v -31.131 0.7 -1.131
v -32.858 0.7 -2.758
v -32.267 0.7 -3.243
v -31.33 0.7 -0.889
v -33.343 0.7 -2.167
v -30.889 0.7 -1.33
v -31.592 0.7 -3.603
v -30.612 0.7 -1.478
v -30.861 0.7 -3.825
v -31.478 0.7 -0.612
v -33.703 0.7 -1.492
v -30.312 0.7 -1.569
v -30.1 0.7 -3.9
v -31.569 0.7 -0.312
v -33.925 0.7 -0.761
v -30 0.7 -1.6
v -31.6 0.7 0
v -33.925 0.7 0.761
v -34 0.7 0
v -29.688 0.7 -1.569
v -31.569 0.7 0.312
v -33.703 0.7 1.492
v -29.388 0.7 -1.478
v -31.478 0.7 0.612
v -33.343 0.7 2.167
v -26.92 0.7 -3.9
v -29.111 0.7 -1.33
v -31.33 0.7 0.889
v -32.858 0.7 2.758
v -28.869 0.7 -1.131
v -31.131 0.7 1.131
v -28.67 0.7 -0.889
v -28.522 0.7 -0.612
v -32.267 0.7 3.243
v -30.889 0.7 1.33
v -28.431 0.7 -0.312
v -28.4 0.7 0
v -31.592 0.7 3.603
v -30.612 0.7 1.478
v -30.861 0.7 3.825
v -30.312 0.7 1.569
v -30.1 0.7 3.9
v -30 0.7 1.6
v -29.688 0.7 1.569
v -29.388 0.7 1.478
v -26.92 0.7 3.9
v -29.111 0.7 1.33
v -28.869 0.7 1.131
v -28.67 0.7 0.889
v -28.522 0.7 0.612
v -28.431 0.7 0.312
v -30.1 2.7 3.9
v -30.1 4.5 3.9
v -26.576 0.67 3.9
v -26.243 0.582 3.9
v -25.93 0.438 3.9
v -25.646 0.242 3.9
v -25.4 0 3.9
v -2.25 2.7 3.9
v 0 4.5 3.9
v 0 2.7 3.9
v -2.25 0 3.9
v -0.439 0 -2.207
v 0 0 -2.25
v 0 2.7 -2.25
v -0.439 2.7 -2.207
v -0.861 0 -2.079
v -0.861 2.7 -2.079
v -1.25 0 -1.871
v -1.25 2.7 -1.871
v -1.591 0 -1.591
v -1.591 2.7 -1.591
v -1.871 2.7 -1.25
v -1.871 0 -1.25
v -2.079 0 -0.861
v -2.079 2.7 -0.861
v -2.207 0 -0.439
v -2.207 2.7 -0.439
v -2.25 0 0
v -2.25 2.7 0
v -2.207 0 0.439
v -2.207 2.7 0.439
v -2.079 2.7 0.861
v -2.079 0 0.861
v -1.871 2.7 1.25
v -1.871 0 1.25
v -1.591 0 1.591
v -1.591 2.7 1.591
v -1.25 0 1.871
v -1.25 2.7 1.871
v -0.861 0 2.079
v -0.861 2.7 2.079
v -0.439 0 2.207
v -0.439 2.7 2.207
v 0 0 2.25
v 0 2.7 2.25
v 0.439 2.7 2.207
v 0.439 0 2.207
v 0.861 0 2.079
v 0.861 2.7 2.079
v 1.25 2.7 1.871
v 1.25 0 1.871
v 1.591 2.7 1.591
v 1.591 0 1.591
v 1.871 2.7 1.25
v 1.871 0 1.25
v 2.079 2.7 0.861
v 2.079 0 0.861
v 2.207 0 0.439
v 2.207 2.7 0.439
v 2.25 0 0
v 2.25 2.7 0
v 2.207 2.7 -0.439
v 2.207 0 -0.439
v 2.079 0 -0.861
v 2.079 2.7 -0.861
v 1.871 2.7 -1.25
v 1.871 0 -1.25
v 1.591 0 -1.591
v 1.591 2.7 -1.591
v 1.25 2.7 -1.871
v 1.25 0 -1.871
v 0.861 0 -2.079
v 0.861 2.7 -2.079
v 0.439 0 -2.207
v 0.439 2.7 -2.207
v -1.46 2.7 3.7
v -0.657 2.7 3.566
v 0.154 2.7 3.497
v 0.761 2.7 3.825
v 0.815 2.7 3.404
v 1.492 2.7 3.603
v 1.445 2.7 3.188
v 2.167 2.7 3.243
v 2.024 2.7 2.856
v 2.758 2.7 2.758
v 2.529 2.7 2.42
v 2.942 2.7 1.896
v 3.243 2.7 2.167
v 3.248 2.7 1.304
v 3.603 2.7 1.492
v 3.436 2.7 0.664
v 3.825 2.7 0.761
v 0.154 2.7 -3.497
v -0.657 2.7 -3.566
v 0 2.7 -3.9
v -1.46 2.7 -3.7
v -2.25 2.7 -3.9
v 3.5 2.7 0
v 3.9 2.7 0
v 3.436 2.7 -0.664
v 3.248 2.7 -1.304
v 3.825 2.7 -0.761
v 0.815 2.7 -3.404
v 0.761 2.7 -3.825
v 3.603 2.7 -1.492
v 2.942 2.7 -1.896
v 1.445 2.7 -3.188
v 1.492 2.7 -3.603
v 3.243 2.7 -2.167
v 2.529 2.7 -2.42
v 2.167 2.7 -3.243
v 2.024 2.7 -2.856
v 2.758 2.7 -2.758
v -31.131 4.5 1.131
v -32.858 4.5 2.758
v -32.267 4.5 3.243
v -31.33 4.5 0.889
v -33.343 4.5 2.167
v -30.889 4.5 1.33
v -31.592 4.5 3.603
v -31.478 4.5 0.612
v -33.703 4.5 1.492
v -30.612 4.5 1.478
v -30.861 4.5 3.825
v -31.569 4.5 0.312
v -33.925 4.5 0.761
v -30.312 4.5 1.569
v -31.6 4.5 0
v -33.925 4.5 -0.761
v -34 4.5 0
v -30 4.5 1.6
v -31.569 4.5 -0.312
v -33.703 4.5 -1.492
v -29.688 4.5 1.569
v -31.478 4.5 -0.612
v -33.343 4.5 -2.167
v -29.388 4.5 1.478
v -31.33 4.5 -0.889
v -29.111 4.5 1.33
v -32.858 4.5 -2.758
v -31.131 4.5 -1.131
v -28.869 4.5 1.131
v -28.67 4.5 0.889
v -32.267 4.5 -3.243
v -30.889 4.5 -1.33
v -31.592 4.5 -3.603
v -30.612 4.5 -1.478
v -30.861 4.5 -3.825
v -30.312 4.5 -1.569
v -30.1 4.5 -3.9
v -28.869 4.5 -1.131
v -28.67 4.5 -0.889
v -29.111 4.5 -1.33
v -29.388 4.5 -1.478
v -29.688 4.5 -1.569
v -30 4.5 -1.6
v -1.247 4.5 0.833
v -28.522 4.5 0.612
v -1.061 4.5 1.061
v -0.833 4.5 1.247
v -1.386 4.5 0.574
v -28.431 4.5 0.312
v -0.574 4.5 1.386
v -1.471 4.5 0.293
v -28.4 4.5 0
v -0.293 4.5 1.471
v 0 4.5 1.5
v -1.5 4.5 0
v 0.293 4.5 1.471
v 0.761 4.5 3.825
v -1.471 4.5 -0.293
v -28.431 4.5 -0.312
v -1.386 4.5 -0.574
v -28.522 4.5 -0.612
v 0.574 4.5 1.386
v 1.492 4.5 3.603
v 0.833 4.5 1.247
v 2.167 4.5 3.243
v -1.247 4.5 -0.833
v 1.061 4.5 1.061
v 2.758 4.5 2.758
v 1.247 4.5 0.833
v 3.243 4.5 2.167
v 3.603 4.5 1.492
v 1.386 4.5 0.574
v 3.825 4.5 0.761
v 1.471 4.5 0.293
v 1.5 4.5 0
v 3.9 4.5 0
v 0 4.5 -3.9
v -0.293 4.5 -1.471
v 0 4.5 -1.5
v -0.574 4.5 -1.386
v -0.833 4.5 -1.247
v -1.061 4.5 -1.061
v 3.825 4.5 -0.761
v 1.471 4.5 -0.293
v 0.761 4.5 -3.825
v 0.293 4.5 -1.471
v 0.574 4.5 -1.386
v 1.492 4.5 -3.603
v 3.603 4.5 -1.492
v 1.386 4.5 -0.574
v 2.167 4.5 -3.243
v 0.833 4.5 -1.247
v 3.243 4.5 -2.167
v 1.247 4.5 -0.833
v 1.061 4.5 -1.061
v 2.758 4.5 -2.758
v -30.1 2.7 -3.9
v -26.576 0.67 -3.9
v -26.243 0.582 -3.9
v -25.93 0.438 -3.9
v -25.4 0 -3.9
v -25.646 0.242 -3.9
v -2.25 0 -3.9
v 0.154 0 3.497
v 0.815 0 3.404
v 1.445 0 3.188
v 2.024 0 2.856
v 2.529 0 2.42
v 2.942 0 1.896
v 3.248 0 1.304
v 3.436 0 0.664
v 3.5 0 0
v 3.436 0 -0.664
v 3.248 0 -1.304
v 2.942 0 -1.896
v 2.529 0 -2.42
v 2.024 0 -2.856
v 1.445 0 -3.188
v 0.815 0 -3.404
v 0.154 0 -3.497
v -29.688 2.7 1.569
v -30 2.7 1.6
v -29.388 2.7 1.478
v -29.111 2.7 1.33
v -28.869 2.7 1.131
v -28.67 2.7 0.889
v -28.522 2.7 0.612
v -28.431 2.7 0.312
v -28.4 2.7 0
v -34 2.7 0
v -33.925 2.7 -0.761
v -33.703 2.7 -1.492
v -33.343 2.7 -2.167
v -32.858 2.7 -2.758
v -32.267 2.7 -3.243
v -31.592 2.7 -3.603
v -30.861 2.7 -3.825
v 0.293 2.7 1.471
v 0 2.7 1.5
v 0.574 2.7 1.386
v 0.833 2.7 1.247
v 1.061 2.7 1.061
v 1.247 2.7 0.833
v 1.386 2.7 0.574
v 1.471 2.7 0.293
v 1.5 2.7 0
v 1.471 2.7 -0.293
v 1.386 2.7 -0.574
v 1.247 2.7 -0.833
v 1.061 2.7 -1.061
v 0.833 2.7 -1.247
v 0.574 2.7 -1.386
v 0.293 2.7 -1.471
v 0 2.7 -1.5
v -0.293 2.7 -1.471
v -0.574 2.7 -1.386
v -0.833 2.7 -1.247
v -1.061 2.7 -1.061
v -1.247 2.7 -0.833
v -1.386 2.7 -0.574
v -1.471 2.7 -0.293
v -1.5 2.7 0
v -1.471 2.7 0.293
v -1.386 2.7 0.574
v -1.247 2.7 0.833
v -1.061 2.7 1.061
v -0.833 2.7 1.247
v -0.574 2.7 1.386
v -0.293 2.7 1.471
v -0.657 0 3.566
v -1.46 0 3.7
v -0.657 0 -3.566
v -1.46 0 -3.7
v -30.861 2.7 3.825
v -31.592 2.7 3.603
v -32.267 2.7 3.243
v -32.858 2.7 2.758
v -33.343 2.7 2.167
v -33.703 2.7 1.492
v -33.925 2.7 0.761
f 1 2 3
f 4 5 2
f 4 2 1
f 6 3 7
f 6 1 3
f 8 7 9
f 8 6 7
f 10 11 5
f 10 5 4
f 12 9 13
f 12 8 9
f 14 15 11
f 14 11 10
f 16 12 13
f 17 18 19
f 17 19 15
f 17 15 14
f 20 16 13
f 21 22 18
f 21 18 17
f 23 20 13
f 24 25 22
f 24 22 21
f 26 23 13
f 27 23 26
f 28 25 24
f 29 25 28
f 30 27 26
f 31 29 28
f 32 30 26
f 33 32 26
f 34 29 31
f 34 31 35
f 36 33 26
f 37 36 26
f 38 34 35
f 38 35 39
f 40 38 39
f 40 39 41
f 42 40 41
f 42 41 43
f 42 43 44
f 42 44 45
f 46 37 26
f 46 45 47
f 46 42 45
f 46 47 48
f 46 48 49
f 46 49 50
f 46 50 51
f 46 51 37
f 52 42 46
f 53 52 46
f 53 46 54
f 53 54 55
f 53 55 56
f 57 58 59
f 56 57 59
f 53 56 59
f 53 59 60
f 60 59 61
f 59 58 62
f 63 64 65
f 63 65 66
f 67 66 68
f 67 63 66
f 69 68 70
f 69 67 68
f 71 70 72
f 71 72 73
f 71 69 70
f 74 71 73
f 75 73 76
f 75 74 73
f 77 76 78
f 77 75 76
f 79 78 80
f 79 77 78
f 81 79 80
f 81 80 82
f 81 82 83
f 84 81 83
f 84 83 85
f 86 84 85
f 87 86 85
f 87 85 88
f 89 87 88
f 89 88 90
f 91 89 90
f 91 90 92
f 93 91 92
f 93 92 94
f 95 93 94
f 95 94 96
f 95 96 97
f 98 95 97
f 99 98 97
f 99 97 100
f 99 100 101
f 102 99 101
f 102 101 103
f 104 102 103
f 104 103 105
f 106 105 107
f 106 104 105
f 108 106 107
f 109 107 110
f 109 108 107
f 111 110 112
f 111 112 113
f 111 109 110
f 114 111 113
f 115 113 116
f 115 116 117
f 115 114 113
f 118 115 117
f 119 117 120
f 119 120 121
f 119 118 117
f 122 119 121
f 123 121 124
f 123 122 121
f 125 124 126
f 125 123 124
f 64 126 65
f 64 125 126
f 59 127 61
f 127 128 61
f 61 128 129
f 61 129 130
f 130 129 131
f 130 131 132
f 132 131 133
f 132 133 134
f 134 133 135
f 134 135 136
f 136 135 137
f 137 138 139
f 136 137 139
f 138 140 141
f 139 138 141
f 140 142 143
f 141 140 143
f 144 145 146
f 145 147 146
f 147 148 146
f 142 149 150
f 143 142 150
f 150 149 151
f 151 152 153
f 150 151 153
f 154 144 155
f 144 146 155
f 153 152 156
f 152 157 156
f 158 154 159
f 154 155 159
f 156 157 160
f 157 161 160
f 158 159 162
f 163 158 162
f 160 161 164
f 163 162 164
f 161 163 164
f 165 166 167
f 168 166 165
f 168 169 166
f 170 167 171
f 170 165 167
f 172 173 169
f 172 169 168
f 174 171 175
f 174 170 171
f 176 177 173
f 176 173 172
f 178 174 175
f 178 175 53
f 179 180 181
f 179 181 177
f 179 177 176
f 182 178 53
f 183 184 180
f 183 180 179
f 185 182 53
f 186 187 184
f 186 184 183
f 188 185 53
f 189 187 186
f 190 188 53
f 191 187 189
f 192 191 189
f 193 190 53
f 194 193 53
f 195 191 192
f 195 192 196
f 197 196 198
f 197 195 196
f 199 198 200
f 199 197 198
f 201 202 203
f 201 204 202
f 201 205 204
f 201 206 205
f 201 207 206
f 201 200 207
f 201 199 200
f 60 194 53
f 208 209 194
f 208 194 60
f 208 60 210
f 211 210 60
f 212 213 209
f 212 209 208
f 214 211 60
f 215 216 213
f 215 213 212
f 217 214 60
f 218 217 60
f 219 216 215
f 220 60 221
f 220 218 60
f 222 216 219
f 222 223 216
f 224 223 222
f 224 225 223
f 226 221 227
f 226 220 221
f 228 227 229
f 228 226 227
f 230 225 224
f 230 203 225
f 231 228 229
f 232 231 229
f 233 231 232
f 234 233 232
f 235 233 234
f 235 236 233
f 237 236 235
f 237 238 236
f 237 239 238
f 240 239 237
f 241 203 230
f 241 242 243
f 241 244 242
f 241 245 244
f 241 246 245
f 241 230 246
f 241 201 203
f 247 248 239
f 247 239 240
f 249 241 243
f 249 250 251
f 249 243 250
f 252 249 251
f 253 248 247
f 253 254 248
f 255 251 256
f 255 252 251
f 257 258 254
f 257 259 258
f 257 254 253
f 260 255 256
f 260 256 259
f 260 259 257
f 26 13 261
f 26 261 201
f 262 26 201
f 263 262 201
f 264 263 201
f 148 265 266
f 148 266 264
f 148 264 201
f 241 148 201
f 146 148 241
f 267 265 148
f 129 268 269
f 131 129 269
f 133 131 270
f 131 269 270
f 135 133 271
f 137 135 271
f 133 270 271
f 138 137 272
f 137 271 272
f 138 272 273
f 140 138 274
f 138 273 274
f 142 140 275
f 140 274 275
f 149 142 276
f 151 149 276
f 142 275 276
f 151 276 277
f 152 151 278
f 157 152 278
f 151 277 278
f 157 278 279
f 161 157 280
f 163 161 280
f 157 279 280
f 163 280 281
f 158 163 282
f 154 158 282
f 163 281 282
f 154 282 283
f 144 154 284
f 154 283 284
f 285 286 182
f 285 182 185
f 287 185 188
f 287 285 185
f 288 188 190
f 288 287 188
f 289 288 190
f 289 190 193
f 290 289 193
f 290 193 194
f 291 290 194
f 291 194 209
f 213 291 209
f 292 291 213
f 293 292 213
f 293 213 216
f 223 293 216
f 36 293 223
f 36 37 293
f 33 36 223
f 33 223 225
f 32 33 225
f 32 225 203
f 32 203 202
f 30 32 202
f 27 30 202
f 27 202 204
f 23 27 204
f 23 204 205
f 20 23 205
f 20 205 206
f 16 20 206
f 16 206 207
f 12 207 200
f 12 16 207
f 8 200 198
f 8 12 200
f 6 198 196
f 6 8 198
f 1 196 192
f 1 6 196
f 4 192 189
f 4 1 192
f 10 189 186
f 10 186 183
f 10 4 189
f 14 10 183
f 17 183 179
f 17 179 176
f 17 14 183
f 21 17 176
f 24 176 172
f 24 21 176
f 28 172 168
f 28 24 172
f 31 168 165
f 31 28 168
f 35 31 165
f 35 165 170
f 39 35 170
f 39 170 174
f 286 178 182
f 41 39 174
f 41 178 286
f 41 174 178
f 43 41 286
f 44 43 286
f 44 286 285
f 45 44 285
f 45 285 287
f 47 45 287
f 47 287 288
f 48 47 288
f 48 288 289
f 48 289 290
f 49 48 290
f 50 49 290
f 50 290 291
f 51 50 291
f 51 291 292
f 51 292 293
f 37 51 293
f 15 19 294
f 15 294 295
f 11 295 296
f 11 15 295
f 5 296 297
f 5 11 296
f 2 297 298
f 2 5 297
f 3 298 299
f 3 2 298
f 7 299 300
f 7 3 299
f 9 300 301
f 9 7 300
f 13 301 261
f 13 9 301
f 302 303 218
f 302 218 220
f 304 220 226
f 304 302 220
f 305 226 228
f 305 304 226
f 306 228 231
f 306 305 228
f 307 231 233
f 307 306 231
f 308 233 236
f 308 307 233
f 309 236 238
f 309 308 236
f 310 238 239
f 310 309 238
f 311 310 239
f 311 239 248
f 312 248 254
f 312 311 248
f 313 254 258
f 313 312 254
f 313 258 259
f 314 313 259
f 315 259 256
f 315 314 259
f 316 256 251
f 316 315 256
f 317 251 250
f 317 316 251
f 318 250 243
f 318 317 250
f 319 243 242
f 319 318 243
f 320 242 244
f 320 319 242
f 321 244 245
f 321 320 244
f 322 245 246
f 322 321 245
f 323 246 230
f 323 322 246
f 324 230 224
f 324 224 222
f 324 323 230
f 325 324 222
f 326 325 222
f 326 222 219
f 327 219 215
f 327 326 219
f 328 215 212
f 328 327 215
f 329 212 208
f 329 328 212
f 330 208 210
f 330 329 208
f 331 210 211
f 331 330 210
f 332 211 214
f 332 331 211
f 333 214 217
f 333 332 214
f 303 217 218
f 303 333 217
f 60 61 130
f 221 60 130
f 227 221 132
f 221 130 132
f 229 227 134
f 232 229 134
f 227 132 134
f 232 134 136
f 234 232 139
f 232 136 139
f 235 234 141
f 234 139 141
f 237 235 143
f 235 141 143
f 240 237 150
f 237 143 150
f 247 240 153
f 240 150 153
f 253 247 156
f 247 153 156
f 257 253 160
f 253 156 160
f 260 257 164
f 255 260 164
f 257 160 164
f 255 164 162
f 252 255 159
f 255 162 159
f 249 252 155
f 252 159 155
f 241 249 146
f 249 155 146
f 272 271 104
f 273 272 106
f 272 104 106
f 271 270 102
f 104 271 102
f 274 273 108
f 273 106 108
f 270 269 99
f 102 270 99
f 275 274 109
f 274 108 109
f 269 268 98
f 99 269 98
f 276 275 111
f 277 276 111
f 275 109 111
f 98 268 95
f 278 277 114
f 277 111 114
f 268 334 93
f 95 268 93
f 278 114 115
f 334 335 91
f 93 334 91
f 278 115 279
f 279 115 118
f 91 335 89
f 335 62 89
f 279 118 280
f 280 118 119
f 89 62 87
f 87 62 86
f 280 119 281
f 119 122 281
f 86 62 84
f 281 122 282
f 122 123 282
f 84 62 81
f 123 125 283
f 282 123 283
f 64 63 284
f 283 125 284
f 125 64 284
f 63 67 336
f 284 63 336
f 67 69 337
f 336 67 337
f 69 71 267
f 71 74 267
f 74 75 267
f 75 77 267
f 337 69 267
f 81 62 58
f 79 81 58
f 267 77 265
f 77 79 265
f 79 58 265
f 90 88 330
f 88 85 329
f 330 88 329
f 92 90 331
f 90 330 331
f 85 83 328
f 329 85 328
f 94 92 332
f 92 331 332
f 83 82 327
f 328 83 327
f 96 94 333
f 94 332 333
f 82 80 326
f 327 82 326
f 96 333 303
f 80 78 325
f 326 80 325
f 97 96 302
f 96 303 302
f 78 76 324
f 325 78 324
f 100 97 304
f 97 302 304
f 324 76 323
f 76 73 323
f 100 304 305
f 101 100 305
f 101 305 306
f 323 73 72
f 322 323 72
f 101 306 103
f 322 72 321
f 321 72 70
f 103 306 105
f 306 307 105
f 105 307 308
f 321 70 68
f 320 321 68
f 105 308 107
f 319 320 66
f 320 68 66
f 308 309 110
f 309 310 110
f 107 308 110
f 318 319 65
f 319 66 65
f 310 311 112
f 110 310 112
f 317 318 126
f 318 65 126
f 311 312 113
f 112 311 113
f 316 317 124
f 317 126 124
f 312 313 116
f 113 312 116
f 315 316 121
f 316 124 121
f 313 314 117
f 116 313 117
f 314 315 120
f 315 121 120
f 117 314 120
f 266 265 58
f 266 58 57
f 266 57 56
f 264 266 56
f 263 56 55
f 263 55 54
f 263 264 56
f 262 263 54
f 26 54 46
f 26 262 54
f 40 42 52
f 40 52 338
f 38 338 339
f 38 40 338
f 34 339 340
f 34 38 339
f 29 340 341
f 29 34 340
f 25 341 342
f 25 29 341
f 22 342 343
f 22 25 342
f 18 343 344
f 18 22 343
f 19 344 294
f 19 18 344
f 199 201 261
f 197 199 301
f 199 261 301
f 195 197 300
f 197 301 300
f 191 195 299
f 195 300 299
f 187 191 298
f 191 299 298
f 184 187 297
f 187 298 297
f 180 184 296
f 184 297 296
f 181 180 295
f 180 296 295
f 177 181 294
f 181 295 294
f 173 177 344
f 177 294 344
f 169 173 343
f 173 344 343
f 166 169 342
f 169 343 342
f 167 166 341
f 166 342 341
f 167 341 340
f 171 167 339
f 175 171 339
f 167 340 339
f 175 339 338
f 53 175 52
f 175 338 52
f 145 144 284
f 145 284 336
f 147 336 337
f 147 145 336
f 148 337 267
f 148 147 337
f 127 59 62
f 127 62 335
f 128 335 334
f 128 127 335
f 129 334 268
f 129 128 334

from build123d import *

# Parameters (mm, degrees)
SKETCH1_R              = 3.5
SKETCH1_R_2            = 2.25
BOSS_EXTRUDE1_DEPTH    = 2.7
SKETCH2_R              = 1.6
SKETCH2_R_2            = 1.5
BOSS_EXTRUDE2_DEPTH    = 1.8
BOSS_EXTRUDE3_DEPTH    = 3.9
FILLET1_R              = 10
CUT_EXTRUDE1_START     = -2
CUT_EXTRUDE1_OUTLINE_R = 1.6
CUT_EXTRUDE1_DEPTH     = 2
FILLET2_R              = 2


# Read off the part's stored shape, not the designer's step: Cut-Extrude1
with BuildPart() as part:
    # Sketch1 → Boss-Extrude1 (new body)
    with BuildSketch(Plane(origin=(0, 0, 0), x_dir=(1, 0, 0), z_dir=(0, 1, 0))):
        with Locations(Location((0, 0, 0), (0, 0, 90))):
            Circle(SKETCH1_R)
        with Locations(Location((0, 0, 0), (0, 0, 90))):
            Circle(SKETCH1_R_2, mode=Mode.SUBTRACT)
    extrude(amount=BOSS_EXTRUDE1_DEPTH)

    # Sketch2 → Boss-Extrude2 (add)
    with BuildSketch(Plane(origin=(0, 2.7, 0), x_dir=(1, 0, 0), z_dir=(0, 1, 0))):
        with BuildLine():
            Line((0, 3.9), (-30.1, 3.9))
            ThreePointArc((-30.1, 3.9), (-34, 0), (-30.1, -3.9))
            Line((-30.1, -3.9), (0, -3.9))
            ThreePointArc((0, -3.9), (3.9, 0), (0, 3.9))
        make_face()
        with Locations(Location((-30, 0, 0), (0, 0, 270))):
            Circle(SKETCH2_R, mode=Mode.SUBTRACT)
        with Locations(Location((0, 0, 0), (0, 0, 270))):
            Circle(SKETCH2_R_2, mode=Mode.SUBTRACT)
    extrude(amount=BOSS_EXTRUDE2_DEPTH)

    # Sketch3 → Boss-Extrude3 (add, symmetric)
    with BuildSketch(Plane.XY):
        Polygon((-25.4, 2.7), (-2.25, 2.7), (-2.25, 0), (-3.5, 0), (-25.4, 0), align=None)
        Polygon((-34, 0.7), (-25.4, 0.7), (-25.4, 2.7), (-28.4, 2.7), (-31.6, 2.7), (-34, 2.7), align=None)
    extrude(amount=BOSS_EXTRUDE3_DEPTH, both=True)

    # Fillet1
    # the kernel refuses this fillet: 10 mm, written as the material it adds along each edge
    with BuildSketch(Plane(origin=(-2.25, 2.7, -2.680951324), x_dir=(0.9469829588957737, 0, -0.3212837928701128), z_dir=(0, -1, 0))) as fillet1_piece_1:
        with BuildLine():
            CenterArc((6.165489318, -9.319153575), FILLET1_R, 111.264619874, 14.002057775)
            Line((0.391660582, -1.154418323), (0.276184008, -0.991123617))
            ThreePointArc((0.276184008, -0.991123617), (0.006433699, -0.64146592), (-0.189396592, -0.064256759))
            Line((-0.189396592, -0.064256759), (0.072535168, 0.186383071))
            ThreePointArc((0.072535168, 0.186383071), (1.269365448, -0.038296249), (2.466195727, 0.186383071))
            Line((2.466195727, 0.186383071), (2.538730895, 0))
        make_face()
    extrude(amount=2.7)
    with BuildSketch(Plane(origin=(-2.25, 2.7, 2.680951324), x_dir=(1.3741079680414238e-12, 0, 1.0), z_dir=(0, -1, 0))) as fillet1_piece_2:
        with BuildLine():
            CenterArc((10.805951419, -2.84452031), FILLET1_R, 163.473903362, 14.002057775)
            Line((0.815653091, -2.404134895), (0.615847125, -2.395327187))
            ThreePointArc((0.615847125, -2.395327187), (0.444092441, -1.189763484), (-0.153197218, -0.128571429))
            Line((-0.153197218, -0.128571429), (0, 0.2))
            ThreePointArc((0, 0.2), (0.609524338, 0.2), (1.027310621, 0.056890406))
            Line((1.027310621, 0.056890406), (1.219048676, 0))
        make_face()
    extrude(amount=2.7)

    # Cut-Extrude1 outline → Cut-Extrude1 (cut)
    with BuildSketch(Plane(origin=(0, 2.7, 0), x_dir=(1, 0, 0), z_dir=(0, 1, 0)).offset(CUT_EXTRUDE1_START)):
        with BuildLine():
            Line((-34, -3.9), (-30.1, -3.9))
            ThreePointArc((-30.1, -3.9), (-32.857716447, -2.757716447), (-34, 0))
            Line((-34, 0), (-34, -3.9))
        make_face()
        with BuildLine():
            Line((-34, 3.9), (-34, 0))
            ThreePointArc((-34, 0), (-32.857716447, 2.757716447), (-30.1, 3.9))
            Line((-30.1, 3.9), (-34, 3.9))
        make_face()
        with Locations((-30, 0)):
            Circle(CUT_EXTRUDE1_OUTLINE_R)
    extrude(amount=CUT_EXTRUDE1_DEPTH, mode=Mode.SUBTRACT)

    # Fillet2
    # the kernel refuses this fillet: 2 mm, written as the material it adds along each edge
    with BuildSketch(Plane(origin=(-25.4, 0.7, -3.9), x_dir=(-1, 0, 0), z_dir=(0, 0, 1))) as fillet2_piece_1:
        with BuildLine():
            CenterArc((1.519868415, 2), FILLET2_R, 220.541601874, 49.458398126)
            Line((0, 0.7), (-0.030397368, 0.674))
            ThreePointArc((-0.030397368, 0.674), (-0.04, 0.35), (-0.04, 0))
            Line((-0.04, 0), (0, -0.04))
            Line((0, -0.04), (1.519868415, -0.04))
            Line((1.519868415, -0.04), (1.519868415, 0))
        make_face()
    extrude(amount=7.8)


solid = part.part
